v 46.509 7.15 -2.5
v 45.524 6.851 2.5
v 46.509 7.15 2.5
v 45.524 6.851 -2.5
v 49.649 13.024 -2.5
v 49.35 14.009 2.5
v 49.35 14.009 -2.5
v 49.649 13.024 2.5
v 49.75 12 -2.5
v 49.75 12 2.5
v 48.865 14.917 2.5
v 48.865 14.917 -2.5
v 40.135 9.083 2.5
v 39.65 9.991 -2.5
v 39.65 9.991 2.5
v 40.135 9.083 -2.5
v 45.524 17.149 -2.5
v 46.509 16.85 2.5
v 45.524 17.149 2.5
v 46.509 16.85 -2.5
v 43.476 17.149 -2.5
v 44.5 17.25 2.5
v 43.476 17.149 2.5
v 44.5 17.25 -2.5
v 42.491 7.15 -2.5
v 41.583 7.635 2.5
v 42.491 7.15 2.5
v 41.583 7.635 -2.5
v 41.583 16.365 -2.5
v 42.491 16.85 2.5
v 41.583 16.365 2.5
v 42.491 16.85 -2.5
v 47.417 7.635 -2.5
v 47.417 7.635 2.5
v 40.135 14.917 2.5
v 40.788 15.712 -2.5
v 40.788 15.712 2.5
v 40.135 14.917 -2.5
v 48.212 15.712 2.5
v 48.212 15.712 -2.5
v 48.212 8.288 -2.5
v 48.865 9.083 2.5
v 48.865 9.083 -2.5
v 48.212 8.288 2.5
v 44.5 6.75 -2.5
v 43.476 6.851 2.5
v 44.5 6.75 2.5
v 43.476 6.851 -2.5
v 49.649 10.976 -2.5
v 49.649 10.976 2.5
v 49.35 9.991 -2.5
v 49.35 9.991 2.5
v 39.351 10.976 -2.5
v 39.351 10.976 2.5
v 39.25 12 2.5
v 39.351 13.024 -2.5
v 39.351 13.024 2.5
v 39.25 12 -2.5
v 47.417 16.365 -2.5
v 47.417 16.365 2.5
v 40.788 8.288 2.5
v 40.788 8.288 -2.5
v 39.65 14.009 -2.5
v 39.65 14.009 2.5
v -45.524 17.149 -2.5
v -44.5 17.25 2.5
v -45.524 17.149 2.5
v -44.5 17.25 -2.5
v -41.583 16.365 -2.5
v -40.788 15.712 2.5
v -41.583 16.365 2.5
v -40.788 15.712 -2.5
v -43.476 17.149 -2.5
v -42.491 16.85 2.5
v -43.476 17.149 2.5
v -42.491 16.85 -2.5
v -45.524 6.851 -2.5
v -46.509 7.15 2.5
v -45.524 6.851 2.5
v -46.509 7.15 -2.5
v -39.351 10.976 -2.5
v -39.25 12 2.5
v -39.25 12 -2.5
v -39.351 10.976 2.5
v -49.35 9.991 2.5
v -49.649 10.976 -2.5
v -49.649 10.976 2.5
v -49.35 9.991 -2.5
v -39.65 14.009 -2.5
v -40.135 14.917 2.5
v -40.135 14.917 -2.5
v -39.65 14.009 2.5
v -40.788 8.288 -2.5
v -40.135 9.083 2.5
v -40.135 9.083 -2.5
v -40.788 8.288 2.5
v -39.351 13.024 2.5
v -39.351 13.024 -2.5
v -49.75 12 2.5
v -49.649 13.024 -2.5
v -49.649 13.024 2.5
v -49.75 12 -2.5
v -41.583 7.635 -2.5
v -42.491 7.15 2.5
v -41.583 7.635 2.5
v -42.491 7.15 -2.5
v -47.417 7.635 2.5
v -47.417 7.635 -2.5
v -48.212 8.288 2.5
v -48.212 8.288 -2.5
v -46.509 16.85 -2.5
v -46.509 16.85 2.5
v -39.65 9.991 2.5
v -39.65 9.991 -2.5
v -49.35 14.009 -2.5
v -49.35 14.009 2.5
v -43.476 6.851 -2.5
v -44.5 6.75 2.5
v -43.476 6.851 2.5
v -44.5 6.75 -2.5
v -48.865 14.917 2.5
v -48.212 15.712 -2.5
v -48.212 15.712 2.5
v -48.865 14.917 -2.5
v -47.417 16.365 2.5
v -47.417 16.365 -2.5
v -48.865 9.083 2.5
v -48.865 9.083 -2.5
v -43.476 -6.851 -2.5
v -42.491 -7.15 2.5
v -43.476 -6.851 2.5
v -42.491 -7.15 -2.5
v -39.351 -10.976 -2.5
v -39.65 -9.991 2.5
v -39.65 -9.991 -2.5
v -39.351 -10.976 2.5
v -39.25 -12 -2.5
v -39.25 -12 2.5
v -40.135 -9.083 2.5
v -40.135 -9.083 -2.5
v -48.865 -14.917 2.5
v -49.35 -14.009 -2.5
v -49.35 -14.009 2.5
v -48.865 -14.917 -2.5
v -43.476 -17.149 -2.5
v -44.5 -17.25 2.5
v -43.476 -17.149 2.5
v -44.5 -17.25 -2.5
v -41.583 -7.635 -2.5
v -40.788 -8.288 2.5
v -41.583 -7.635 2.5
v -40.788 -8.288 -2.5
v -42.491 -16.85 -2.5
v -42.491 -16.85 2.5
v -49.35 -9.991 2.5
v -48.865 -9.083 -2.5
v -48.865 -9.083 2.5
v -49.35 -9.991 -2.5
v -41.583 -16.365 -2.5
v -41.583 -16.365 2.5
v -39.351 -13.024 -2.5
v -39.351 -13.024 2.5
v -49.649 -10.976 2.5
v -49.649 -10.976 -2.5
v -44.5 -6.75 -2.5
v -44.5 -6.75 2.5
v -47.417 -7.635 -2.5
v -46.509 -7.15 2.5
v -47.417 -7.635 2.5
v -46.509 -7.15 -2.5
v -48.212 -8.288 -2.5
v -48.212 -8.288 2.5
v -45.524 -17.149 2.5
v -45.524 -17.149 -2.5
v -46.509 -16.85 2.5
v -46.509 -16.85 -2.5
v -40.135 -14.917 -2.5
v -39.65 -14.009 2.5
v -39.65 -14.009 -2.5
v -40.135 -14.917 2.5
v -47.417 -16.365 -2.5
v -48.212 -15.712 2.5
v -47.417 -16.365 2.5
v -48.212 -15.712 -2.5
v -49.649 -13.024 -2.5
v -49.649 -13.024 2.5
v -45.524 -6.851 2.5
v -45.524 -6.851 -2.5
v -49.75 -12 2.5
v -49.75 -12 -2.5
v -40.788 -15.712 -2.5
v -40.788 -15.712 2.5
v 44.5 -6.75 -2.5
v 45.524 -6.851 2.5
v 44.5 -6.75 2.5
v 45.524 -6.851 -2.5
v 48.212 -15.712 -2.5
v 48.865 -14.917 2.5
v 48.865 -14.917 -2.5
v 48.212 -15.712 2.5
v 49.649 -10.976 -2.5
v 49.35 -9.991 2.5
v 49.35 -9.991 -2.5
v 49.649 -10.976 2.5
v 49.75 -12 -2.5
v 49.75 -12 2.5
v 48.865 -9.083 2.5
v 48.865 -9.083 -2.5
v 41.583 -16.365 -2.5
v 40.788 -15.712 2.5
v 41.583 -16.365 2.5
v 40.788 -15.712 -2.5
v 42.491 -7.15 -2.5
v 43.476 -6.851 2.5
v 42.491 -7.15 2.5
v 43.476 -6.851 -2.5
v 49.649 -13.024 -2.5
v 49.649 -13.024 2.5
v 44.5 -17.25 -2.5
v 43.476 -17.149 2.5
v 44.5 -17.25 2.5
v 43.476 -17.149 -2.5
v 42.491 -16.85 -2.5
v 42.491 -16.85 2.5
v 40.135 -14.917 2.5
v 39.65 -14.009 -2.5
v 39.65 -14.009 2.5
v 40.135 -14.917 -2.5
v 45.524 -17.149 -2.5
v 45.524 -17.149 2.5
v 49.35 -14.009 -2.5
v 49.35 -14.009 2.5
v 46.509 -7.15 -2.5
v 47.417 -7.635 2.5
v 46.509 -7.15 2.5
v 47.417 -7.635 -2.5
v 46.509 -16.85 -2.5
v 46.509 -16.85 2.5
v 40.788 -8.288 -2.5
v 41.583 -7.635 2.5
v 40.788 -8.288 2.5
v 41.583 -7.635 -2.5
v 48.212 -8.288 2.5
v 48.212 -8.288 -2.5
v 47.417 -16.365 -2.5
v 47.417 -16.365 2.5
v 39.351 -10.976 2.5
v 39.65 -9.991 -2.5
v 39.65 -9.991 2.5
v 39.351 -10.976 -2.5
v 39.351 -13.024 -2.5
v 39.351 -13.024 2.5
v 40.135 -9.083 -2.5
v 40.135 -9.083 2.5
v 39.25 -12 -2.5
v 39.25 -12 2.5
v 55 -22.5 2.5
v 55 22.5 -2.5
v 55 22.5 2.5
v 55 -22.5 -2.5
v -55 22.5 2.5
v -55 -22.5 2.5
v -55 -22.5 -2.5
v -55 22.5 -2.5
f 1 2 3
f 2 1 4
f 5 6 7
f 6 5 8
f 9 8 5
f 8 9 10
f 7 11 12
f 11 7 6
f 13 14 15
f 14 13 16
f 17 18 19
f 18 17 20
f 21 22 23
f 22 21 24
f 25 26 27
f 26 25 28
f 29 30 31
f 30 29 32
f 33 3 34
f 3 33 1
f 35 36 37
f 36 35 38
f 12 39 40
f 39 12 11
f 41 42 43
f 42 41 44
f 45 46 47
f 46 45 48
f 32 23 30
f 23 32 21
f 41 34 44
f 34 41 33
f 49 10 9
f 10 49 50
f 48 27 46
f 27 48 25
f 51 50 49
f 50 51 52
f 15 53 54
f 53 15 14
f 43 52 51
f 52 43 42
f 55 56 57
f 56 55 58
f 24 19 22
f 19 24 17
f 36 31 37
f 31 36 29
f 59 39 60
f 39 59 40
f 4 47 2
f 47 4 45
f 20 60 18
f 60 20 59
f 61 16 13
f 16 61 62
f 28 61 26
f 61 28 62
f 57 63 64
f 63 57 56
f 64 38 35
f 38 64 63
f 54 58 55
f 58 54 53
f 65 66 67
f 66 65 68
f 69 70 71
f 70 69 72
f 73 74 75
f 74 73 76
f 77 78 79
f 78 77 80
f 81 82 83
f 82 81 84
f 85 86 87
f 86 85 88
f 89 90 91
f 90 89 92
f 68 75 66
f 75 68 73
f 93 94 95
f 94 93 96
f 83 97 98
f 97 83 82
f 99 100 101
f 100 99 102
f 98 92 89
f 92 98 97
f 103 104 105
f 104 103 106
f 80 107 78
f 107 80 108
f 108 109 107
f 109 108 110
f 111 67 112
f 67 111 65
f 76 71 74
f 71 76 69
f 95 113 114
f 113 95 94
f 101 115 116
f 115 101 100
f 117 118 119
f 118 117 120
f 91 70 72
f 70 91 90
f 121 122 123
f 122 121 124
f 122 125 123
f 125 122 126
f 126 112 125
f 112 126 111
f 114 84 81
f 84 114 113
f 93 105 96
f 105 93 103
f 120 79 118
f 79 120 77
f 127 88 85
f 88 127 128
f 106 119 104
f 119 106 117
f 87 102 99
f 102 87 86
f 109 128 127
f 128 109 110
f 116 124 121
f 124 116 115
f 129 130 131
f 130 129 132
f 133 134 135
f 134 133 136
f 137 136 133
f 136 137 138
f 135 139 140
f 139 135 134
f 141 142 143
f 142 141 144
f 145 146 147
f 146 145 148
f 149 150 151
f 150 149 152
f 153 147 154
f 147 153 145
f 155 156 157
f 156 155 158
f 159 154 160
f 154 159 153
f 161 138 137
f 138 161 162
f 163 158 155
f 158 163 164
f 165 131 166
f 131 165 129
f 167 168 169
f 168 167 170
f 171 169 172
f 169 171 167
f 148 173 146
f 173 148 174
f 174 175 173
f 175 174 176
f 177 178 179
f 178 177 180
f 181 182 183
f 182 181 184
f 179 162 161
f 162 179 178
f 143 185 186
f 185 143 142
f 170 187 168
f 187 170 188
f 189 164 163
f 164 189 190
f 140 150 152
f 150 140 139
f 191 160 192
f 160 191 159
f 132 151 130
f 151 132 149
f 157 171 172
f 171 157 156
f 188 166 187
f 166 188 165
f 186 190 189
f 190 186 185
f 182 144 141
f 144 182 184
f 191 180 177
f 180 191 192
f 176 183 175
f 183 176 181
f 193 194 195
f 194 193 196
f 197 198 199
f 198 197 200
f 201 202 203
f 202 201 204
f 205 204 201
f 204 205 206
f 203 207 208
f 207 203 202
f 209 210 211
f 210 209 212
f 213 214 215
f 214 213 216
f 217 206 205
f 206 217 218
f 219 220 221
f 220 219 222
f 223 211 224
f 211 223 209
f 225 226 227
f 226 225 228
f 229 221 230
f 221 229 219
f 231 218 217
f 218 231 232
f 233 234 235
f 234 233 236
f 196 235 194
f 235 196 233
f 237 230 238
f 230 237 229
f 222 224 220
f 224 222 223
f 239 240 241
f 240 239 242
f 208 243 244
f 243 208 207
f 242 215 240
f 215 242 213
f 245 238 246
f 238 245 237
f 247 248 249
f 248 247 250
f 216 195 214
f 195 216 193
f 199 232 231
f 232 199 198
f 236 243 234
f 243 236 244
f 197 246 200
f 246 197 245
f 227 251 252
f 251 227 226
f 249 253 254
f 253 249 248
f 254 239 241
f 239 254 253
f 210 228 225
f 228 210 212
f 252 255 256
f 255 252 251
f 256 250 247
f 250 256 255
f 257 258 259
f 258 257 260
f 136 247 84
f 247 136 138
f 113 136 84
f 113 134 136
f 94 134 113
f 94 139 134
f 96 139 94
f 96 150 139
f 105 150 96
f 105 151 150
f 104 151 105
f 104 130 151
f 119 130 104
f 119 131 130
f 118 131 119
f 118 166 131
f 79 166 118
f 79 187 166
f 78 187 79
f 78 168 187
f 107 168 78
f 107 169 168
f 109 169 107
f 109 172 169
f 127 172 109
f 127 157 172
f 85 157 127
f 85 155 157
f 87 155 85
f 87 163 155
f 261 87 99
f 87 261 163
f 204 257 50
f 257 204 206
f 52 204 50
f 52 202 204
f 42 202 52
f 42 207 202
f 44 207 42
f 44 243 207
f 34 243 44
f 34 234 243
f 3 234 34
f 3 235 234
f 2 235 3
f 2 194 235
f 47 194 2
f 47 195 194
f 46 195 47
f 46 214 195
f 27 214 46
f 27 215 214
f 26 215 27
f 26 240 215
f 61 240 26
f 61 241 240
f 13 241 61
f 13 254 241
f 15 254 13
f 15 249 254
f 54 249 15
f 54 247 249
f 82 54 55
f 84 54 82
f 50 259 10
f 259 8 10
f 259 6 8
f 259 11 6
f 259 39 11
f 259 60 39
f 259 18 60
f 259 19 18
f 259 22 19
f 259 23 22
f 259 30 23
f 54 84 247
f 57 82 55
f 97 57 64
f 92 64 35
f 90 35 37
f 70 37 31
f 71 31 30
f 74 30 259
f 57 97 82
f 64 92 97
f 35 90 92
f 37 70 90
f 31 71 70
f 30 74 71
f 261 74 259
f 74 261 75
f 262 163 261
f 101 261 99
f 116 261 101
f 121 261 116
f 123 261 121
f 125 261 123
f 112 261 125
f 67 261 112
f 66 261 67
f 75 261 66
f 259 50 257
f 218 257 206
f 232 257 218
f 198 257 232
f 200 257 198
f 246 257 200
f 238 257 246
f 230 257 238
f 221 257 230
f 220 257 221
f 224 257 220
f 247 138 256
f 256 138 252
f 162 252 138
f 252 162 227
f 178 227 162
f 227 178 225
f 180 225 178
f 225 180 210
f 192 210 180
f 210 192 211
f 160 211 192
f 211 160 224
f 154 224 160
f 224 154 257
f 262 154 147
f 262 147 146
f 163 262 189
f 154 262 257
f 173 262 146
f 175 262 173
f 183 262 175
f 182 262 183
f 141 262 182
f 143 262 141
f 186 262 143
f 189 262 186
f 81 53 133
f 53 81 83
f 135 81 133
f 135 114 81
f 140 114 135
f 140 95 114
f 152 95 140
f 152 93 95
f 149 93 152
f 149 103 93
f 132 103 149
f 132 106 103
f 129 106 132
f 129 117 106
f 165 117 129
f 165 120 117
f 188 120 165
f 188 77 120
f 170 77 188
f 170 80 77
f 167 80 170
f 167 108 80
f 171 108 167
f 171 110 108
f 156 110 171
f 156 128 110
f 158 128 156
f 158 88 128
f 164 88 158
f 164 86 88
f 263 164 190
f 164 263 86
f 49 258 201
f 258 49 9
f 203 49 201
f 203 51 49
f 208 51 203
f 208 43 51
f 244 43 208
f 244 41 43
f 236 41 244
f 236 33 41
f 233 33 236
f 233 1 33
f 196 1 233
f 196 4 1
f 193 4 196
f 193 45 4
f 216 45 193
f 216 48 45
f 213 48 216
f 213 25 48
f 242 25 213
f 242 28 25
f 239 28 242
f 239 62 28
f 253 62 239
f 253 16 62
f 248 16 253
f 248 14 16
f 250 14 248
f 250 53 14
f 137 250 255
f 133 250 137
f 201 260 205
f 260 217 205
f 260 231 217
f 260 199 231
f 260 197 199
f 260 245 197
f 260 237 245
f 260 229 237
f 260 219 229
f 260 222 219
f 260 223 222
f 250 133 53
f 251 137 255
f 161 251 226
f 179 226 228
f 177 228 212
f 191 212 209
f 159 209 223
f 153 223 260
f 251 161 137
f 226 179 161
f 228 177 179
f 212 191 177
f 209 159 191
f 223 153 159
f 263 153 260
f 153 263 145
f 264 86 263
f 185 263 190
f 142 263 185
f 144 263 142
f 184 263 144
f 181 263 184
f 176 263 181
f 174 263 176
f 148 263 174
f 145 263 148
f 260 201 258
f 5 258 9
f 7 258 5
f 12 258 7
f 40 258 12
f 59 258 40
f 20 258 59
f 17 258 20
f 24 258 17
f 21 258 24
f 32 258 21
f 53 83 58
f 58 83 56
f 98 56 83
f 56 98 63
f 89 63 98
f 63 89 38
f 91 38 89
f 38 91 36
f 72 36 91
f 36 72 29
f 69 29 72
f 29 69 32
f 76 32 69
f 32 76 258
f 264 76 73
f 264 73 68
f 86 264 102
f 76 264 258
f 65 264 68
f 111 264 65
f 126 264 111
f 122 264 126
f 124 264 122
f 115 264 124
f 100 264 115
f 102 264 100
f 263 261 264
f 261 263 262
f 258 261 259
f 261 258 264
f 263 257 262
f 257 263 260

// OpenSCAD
$fn = 32;

// ----------------------------------------------------------------------
// Corner plate 110 x 45 x 5
// 4 holes, centres taken from the edge offset
// ----------------------------------------------------------------------

// --- parameters (mm) ---
plate = [110, 45, 5];  // overall size (x, y, z)
holes = 4;             // number of holes the drawing asks for
hole_d = 10.5;         // hole diameter
edge = 10.5;           // hole centre offset from the plate edge

// --- derived feature positions (mm) ---
corner_x = plate[0] / 2 - edge;  // = 44.5   corner hole X
corner_y = plate[1] / 2 - edge;  // = 12   corner hole Y
feature_centers = [
  [corner_x, corner_y],
  [-corner_x, corner_y],
  [-corner_x, -corner_y],
  [corner_x, -corner_y]
];   // hole centres the loop below drills

// plate outline, every hole drilled through with the same cutters
difference() {
  cube(plate, center = true);
  for (centre = feature_centers)
    translate([centre[0], centre[1], 0])
      cylinder(d = hole_d, h = plate[2] + 2, center = true);
}
